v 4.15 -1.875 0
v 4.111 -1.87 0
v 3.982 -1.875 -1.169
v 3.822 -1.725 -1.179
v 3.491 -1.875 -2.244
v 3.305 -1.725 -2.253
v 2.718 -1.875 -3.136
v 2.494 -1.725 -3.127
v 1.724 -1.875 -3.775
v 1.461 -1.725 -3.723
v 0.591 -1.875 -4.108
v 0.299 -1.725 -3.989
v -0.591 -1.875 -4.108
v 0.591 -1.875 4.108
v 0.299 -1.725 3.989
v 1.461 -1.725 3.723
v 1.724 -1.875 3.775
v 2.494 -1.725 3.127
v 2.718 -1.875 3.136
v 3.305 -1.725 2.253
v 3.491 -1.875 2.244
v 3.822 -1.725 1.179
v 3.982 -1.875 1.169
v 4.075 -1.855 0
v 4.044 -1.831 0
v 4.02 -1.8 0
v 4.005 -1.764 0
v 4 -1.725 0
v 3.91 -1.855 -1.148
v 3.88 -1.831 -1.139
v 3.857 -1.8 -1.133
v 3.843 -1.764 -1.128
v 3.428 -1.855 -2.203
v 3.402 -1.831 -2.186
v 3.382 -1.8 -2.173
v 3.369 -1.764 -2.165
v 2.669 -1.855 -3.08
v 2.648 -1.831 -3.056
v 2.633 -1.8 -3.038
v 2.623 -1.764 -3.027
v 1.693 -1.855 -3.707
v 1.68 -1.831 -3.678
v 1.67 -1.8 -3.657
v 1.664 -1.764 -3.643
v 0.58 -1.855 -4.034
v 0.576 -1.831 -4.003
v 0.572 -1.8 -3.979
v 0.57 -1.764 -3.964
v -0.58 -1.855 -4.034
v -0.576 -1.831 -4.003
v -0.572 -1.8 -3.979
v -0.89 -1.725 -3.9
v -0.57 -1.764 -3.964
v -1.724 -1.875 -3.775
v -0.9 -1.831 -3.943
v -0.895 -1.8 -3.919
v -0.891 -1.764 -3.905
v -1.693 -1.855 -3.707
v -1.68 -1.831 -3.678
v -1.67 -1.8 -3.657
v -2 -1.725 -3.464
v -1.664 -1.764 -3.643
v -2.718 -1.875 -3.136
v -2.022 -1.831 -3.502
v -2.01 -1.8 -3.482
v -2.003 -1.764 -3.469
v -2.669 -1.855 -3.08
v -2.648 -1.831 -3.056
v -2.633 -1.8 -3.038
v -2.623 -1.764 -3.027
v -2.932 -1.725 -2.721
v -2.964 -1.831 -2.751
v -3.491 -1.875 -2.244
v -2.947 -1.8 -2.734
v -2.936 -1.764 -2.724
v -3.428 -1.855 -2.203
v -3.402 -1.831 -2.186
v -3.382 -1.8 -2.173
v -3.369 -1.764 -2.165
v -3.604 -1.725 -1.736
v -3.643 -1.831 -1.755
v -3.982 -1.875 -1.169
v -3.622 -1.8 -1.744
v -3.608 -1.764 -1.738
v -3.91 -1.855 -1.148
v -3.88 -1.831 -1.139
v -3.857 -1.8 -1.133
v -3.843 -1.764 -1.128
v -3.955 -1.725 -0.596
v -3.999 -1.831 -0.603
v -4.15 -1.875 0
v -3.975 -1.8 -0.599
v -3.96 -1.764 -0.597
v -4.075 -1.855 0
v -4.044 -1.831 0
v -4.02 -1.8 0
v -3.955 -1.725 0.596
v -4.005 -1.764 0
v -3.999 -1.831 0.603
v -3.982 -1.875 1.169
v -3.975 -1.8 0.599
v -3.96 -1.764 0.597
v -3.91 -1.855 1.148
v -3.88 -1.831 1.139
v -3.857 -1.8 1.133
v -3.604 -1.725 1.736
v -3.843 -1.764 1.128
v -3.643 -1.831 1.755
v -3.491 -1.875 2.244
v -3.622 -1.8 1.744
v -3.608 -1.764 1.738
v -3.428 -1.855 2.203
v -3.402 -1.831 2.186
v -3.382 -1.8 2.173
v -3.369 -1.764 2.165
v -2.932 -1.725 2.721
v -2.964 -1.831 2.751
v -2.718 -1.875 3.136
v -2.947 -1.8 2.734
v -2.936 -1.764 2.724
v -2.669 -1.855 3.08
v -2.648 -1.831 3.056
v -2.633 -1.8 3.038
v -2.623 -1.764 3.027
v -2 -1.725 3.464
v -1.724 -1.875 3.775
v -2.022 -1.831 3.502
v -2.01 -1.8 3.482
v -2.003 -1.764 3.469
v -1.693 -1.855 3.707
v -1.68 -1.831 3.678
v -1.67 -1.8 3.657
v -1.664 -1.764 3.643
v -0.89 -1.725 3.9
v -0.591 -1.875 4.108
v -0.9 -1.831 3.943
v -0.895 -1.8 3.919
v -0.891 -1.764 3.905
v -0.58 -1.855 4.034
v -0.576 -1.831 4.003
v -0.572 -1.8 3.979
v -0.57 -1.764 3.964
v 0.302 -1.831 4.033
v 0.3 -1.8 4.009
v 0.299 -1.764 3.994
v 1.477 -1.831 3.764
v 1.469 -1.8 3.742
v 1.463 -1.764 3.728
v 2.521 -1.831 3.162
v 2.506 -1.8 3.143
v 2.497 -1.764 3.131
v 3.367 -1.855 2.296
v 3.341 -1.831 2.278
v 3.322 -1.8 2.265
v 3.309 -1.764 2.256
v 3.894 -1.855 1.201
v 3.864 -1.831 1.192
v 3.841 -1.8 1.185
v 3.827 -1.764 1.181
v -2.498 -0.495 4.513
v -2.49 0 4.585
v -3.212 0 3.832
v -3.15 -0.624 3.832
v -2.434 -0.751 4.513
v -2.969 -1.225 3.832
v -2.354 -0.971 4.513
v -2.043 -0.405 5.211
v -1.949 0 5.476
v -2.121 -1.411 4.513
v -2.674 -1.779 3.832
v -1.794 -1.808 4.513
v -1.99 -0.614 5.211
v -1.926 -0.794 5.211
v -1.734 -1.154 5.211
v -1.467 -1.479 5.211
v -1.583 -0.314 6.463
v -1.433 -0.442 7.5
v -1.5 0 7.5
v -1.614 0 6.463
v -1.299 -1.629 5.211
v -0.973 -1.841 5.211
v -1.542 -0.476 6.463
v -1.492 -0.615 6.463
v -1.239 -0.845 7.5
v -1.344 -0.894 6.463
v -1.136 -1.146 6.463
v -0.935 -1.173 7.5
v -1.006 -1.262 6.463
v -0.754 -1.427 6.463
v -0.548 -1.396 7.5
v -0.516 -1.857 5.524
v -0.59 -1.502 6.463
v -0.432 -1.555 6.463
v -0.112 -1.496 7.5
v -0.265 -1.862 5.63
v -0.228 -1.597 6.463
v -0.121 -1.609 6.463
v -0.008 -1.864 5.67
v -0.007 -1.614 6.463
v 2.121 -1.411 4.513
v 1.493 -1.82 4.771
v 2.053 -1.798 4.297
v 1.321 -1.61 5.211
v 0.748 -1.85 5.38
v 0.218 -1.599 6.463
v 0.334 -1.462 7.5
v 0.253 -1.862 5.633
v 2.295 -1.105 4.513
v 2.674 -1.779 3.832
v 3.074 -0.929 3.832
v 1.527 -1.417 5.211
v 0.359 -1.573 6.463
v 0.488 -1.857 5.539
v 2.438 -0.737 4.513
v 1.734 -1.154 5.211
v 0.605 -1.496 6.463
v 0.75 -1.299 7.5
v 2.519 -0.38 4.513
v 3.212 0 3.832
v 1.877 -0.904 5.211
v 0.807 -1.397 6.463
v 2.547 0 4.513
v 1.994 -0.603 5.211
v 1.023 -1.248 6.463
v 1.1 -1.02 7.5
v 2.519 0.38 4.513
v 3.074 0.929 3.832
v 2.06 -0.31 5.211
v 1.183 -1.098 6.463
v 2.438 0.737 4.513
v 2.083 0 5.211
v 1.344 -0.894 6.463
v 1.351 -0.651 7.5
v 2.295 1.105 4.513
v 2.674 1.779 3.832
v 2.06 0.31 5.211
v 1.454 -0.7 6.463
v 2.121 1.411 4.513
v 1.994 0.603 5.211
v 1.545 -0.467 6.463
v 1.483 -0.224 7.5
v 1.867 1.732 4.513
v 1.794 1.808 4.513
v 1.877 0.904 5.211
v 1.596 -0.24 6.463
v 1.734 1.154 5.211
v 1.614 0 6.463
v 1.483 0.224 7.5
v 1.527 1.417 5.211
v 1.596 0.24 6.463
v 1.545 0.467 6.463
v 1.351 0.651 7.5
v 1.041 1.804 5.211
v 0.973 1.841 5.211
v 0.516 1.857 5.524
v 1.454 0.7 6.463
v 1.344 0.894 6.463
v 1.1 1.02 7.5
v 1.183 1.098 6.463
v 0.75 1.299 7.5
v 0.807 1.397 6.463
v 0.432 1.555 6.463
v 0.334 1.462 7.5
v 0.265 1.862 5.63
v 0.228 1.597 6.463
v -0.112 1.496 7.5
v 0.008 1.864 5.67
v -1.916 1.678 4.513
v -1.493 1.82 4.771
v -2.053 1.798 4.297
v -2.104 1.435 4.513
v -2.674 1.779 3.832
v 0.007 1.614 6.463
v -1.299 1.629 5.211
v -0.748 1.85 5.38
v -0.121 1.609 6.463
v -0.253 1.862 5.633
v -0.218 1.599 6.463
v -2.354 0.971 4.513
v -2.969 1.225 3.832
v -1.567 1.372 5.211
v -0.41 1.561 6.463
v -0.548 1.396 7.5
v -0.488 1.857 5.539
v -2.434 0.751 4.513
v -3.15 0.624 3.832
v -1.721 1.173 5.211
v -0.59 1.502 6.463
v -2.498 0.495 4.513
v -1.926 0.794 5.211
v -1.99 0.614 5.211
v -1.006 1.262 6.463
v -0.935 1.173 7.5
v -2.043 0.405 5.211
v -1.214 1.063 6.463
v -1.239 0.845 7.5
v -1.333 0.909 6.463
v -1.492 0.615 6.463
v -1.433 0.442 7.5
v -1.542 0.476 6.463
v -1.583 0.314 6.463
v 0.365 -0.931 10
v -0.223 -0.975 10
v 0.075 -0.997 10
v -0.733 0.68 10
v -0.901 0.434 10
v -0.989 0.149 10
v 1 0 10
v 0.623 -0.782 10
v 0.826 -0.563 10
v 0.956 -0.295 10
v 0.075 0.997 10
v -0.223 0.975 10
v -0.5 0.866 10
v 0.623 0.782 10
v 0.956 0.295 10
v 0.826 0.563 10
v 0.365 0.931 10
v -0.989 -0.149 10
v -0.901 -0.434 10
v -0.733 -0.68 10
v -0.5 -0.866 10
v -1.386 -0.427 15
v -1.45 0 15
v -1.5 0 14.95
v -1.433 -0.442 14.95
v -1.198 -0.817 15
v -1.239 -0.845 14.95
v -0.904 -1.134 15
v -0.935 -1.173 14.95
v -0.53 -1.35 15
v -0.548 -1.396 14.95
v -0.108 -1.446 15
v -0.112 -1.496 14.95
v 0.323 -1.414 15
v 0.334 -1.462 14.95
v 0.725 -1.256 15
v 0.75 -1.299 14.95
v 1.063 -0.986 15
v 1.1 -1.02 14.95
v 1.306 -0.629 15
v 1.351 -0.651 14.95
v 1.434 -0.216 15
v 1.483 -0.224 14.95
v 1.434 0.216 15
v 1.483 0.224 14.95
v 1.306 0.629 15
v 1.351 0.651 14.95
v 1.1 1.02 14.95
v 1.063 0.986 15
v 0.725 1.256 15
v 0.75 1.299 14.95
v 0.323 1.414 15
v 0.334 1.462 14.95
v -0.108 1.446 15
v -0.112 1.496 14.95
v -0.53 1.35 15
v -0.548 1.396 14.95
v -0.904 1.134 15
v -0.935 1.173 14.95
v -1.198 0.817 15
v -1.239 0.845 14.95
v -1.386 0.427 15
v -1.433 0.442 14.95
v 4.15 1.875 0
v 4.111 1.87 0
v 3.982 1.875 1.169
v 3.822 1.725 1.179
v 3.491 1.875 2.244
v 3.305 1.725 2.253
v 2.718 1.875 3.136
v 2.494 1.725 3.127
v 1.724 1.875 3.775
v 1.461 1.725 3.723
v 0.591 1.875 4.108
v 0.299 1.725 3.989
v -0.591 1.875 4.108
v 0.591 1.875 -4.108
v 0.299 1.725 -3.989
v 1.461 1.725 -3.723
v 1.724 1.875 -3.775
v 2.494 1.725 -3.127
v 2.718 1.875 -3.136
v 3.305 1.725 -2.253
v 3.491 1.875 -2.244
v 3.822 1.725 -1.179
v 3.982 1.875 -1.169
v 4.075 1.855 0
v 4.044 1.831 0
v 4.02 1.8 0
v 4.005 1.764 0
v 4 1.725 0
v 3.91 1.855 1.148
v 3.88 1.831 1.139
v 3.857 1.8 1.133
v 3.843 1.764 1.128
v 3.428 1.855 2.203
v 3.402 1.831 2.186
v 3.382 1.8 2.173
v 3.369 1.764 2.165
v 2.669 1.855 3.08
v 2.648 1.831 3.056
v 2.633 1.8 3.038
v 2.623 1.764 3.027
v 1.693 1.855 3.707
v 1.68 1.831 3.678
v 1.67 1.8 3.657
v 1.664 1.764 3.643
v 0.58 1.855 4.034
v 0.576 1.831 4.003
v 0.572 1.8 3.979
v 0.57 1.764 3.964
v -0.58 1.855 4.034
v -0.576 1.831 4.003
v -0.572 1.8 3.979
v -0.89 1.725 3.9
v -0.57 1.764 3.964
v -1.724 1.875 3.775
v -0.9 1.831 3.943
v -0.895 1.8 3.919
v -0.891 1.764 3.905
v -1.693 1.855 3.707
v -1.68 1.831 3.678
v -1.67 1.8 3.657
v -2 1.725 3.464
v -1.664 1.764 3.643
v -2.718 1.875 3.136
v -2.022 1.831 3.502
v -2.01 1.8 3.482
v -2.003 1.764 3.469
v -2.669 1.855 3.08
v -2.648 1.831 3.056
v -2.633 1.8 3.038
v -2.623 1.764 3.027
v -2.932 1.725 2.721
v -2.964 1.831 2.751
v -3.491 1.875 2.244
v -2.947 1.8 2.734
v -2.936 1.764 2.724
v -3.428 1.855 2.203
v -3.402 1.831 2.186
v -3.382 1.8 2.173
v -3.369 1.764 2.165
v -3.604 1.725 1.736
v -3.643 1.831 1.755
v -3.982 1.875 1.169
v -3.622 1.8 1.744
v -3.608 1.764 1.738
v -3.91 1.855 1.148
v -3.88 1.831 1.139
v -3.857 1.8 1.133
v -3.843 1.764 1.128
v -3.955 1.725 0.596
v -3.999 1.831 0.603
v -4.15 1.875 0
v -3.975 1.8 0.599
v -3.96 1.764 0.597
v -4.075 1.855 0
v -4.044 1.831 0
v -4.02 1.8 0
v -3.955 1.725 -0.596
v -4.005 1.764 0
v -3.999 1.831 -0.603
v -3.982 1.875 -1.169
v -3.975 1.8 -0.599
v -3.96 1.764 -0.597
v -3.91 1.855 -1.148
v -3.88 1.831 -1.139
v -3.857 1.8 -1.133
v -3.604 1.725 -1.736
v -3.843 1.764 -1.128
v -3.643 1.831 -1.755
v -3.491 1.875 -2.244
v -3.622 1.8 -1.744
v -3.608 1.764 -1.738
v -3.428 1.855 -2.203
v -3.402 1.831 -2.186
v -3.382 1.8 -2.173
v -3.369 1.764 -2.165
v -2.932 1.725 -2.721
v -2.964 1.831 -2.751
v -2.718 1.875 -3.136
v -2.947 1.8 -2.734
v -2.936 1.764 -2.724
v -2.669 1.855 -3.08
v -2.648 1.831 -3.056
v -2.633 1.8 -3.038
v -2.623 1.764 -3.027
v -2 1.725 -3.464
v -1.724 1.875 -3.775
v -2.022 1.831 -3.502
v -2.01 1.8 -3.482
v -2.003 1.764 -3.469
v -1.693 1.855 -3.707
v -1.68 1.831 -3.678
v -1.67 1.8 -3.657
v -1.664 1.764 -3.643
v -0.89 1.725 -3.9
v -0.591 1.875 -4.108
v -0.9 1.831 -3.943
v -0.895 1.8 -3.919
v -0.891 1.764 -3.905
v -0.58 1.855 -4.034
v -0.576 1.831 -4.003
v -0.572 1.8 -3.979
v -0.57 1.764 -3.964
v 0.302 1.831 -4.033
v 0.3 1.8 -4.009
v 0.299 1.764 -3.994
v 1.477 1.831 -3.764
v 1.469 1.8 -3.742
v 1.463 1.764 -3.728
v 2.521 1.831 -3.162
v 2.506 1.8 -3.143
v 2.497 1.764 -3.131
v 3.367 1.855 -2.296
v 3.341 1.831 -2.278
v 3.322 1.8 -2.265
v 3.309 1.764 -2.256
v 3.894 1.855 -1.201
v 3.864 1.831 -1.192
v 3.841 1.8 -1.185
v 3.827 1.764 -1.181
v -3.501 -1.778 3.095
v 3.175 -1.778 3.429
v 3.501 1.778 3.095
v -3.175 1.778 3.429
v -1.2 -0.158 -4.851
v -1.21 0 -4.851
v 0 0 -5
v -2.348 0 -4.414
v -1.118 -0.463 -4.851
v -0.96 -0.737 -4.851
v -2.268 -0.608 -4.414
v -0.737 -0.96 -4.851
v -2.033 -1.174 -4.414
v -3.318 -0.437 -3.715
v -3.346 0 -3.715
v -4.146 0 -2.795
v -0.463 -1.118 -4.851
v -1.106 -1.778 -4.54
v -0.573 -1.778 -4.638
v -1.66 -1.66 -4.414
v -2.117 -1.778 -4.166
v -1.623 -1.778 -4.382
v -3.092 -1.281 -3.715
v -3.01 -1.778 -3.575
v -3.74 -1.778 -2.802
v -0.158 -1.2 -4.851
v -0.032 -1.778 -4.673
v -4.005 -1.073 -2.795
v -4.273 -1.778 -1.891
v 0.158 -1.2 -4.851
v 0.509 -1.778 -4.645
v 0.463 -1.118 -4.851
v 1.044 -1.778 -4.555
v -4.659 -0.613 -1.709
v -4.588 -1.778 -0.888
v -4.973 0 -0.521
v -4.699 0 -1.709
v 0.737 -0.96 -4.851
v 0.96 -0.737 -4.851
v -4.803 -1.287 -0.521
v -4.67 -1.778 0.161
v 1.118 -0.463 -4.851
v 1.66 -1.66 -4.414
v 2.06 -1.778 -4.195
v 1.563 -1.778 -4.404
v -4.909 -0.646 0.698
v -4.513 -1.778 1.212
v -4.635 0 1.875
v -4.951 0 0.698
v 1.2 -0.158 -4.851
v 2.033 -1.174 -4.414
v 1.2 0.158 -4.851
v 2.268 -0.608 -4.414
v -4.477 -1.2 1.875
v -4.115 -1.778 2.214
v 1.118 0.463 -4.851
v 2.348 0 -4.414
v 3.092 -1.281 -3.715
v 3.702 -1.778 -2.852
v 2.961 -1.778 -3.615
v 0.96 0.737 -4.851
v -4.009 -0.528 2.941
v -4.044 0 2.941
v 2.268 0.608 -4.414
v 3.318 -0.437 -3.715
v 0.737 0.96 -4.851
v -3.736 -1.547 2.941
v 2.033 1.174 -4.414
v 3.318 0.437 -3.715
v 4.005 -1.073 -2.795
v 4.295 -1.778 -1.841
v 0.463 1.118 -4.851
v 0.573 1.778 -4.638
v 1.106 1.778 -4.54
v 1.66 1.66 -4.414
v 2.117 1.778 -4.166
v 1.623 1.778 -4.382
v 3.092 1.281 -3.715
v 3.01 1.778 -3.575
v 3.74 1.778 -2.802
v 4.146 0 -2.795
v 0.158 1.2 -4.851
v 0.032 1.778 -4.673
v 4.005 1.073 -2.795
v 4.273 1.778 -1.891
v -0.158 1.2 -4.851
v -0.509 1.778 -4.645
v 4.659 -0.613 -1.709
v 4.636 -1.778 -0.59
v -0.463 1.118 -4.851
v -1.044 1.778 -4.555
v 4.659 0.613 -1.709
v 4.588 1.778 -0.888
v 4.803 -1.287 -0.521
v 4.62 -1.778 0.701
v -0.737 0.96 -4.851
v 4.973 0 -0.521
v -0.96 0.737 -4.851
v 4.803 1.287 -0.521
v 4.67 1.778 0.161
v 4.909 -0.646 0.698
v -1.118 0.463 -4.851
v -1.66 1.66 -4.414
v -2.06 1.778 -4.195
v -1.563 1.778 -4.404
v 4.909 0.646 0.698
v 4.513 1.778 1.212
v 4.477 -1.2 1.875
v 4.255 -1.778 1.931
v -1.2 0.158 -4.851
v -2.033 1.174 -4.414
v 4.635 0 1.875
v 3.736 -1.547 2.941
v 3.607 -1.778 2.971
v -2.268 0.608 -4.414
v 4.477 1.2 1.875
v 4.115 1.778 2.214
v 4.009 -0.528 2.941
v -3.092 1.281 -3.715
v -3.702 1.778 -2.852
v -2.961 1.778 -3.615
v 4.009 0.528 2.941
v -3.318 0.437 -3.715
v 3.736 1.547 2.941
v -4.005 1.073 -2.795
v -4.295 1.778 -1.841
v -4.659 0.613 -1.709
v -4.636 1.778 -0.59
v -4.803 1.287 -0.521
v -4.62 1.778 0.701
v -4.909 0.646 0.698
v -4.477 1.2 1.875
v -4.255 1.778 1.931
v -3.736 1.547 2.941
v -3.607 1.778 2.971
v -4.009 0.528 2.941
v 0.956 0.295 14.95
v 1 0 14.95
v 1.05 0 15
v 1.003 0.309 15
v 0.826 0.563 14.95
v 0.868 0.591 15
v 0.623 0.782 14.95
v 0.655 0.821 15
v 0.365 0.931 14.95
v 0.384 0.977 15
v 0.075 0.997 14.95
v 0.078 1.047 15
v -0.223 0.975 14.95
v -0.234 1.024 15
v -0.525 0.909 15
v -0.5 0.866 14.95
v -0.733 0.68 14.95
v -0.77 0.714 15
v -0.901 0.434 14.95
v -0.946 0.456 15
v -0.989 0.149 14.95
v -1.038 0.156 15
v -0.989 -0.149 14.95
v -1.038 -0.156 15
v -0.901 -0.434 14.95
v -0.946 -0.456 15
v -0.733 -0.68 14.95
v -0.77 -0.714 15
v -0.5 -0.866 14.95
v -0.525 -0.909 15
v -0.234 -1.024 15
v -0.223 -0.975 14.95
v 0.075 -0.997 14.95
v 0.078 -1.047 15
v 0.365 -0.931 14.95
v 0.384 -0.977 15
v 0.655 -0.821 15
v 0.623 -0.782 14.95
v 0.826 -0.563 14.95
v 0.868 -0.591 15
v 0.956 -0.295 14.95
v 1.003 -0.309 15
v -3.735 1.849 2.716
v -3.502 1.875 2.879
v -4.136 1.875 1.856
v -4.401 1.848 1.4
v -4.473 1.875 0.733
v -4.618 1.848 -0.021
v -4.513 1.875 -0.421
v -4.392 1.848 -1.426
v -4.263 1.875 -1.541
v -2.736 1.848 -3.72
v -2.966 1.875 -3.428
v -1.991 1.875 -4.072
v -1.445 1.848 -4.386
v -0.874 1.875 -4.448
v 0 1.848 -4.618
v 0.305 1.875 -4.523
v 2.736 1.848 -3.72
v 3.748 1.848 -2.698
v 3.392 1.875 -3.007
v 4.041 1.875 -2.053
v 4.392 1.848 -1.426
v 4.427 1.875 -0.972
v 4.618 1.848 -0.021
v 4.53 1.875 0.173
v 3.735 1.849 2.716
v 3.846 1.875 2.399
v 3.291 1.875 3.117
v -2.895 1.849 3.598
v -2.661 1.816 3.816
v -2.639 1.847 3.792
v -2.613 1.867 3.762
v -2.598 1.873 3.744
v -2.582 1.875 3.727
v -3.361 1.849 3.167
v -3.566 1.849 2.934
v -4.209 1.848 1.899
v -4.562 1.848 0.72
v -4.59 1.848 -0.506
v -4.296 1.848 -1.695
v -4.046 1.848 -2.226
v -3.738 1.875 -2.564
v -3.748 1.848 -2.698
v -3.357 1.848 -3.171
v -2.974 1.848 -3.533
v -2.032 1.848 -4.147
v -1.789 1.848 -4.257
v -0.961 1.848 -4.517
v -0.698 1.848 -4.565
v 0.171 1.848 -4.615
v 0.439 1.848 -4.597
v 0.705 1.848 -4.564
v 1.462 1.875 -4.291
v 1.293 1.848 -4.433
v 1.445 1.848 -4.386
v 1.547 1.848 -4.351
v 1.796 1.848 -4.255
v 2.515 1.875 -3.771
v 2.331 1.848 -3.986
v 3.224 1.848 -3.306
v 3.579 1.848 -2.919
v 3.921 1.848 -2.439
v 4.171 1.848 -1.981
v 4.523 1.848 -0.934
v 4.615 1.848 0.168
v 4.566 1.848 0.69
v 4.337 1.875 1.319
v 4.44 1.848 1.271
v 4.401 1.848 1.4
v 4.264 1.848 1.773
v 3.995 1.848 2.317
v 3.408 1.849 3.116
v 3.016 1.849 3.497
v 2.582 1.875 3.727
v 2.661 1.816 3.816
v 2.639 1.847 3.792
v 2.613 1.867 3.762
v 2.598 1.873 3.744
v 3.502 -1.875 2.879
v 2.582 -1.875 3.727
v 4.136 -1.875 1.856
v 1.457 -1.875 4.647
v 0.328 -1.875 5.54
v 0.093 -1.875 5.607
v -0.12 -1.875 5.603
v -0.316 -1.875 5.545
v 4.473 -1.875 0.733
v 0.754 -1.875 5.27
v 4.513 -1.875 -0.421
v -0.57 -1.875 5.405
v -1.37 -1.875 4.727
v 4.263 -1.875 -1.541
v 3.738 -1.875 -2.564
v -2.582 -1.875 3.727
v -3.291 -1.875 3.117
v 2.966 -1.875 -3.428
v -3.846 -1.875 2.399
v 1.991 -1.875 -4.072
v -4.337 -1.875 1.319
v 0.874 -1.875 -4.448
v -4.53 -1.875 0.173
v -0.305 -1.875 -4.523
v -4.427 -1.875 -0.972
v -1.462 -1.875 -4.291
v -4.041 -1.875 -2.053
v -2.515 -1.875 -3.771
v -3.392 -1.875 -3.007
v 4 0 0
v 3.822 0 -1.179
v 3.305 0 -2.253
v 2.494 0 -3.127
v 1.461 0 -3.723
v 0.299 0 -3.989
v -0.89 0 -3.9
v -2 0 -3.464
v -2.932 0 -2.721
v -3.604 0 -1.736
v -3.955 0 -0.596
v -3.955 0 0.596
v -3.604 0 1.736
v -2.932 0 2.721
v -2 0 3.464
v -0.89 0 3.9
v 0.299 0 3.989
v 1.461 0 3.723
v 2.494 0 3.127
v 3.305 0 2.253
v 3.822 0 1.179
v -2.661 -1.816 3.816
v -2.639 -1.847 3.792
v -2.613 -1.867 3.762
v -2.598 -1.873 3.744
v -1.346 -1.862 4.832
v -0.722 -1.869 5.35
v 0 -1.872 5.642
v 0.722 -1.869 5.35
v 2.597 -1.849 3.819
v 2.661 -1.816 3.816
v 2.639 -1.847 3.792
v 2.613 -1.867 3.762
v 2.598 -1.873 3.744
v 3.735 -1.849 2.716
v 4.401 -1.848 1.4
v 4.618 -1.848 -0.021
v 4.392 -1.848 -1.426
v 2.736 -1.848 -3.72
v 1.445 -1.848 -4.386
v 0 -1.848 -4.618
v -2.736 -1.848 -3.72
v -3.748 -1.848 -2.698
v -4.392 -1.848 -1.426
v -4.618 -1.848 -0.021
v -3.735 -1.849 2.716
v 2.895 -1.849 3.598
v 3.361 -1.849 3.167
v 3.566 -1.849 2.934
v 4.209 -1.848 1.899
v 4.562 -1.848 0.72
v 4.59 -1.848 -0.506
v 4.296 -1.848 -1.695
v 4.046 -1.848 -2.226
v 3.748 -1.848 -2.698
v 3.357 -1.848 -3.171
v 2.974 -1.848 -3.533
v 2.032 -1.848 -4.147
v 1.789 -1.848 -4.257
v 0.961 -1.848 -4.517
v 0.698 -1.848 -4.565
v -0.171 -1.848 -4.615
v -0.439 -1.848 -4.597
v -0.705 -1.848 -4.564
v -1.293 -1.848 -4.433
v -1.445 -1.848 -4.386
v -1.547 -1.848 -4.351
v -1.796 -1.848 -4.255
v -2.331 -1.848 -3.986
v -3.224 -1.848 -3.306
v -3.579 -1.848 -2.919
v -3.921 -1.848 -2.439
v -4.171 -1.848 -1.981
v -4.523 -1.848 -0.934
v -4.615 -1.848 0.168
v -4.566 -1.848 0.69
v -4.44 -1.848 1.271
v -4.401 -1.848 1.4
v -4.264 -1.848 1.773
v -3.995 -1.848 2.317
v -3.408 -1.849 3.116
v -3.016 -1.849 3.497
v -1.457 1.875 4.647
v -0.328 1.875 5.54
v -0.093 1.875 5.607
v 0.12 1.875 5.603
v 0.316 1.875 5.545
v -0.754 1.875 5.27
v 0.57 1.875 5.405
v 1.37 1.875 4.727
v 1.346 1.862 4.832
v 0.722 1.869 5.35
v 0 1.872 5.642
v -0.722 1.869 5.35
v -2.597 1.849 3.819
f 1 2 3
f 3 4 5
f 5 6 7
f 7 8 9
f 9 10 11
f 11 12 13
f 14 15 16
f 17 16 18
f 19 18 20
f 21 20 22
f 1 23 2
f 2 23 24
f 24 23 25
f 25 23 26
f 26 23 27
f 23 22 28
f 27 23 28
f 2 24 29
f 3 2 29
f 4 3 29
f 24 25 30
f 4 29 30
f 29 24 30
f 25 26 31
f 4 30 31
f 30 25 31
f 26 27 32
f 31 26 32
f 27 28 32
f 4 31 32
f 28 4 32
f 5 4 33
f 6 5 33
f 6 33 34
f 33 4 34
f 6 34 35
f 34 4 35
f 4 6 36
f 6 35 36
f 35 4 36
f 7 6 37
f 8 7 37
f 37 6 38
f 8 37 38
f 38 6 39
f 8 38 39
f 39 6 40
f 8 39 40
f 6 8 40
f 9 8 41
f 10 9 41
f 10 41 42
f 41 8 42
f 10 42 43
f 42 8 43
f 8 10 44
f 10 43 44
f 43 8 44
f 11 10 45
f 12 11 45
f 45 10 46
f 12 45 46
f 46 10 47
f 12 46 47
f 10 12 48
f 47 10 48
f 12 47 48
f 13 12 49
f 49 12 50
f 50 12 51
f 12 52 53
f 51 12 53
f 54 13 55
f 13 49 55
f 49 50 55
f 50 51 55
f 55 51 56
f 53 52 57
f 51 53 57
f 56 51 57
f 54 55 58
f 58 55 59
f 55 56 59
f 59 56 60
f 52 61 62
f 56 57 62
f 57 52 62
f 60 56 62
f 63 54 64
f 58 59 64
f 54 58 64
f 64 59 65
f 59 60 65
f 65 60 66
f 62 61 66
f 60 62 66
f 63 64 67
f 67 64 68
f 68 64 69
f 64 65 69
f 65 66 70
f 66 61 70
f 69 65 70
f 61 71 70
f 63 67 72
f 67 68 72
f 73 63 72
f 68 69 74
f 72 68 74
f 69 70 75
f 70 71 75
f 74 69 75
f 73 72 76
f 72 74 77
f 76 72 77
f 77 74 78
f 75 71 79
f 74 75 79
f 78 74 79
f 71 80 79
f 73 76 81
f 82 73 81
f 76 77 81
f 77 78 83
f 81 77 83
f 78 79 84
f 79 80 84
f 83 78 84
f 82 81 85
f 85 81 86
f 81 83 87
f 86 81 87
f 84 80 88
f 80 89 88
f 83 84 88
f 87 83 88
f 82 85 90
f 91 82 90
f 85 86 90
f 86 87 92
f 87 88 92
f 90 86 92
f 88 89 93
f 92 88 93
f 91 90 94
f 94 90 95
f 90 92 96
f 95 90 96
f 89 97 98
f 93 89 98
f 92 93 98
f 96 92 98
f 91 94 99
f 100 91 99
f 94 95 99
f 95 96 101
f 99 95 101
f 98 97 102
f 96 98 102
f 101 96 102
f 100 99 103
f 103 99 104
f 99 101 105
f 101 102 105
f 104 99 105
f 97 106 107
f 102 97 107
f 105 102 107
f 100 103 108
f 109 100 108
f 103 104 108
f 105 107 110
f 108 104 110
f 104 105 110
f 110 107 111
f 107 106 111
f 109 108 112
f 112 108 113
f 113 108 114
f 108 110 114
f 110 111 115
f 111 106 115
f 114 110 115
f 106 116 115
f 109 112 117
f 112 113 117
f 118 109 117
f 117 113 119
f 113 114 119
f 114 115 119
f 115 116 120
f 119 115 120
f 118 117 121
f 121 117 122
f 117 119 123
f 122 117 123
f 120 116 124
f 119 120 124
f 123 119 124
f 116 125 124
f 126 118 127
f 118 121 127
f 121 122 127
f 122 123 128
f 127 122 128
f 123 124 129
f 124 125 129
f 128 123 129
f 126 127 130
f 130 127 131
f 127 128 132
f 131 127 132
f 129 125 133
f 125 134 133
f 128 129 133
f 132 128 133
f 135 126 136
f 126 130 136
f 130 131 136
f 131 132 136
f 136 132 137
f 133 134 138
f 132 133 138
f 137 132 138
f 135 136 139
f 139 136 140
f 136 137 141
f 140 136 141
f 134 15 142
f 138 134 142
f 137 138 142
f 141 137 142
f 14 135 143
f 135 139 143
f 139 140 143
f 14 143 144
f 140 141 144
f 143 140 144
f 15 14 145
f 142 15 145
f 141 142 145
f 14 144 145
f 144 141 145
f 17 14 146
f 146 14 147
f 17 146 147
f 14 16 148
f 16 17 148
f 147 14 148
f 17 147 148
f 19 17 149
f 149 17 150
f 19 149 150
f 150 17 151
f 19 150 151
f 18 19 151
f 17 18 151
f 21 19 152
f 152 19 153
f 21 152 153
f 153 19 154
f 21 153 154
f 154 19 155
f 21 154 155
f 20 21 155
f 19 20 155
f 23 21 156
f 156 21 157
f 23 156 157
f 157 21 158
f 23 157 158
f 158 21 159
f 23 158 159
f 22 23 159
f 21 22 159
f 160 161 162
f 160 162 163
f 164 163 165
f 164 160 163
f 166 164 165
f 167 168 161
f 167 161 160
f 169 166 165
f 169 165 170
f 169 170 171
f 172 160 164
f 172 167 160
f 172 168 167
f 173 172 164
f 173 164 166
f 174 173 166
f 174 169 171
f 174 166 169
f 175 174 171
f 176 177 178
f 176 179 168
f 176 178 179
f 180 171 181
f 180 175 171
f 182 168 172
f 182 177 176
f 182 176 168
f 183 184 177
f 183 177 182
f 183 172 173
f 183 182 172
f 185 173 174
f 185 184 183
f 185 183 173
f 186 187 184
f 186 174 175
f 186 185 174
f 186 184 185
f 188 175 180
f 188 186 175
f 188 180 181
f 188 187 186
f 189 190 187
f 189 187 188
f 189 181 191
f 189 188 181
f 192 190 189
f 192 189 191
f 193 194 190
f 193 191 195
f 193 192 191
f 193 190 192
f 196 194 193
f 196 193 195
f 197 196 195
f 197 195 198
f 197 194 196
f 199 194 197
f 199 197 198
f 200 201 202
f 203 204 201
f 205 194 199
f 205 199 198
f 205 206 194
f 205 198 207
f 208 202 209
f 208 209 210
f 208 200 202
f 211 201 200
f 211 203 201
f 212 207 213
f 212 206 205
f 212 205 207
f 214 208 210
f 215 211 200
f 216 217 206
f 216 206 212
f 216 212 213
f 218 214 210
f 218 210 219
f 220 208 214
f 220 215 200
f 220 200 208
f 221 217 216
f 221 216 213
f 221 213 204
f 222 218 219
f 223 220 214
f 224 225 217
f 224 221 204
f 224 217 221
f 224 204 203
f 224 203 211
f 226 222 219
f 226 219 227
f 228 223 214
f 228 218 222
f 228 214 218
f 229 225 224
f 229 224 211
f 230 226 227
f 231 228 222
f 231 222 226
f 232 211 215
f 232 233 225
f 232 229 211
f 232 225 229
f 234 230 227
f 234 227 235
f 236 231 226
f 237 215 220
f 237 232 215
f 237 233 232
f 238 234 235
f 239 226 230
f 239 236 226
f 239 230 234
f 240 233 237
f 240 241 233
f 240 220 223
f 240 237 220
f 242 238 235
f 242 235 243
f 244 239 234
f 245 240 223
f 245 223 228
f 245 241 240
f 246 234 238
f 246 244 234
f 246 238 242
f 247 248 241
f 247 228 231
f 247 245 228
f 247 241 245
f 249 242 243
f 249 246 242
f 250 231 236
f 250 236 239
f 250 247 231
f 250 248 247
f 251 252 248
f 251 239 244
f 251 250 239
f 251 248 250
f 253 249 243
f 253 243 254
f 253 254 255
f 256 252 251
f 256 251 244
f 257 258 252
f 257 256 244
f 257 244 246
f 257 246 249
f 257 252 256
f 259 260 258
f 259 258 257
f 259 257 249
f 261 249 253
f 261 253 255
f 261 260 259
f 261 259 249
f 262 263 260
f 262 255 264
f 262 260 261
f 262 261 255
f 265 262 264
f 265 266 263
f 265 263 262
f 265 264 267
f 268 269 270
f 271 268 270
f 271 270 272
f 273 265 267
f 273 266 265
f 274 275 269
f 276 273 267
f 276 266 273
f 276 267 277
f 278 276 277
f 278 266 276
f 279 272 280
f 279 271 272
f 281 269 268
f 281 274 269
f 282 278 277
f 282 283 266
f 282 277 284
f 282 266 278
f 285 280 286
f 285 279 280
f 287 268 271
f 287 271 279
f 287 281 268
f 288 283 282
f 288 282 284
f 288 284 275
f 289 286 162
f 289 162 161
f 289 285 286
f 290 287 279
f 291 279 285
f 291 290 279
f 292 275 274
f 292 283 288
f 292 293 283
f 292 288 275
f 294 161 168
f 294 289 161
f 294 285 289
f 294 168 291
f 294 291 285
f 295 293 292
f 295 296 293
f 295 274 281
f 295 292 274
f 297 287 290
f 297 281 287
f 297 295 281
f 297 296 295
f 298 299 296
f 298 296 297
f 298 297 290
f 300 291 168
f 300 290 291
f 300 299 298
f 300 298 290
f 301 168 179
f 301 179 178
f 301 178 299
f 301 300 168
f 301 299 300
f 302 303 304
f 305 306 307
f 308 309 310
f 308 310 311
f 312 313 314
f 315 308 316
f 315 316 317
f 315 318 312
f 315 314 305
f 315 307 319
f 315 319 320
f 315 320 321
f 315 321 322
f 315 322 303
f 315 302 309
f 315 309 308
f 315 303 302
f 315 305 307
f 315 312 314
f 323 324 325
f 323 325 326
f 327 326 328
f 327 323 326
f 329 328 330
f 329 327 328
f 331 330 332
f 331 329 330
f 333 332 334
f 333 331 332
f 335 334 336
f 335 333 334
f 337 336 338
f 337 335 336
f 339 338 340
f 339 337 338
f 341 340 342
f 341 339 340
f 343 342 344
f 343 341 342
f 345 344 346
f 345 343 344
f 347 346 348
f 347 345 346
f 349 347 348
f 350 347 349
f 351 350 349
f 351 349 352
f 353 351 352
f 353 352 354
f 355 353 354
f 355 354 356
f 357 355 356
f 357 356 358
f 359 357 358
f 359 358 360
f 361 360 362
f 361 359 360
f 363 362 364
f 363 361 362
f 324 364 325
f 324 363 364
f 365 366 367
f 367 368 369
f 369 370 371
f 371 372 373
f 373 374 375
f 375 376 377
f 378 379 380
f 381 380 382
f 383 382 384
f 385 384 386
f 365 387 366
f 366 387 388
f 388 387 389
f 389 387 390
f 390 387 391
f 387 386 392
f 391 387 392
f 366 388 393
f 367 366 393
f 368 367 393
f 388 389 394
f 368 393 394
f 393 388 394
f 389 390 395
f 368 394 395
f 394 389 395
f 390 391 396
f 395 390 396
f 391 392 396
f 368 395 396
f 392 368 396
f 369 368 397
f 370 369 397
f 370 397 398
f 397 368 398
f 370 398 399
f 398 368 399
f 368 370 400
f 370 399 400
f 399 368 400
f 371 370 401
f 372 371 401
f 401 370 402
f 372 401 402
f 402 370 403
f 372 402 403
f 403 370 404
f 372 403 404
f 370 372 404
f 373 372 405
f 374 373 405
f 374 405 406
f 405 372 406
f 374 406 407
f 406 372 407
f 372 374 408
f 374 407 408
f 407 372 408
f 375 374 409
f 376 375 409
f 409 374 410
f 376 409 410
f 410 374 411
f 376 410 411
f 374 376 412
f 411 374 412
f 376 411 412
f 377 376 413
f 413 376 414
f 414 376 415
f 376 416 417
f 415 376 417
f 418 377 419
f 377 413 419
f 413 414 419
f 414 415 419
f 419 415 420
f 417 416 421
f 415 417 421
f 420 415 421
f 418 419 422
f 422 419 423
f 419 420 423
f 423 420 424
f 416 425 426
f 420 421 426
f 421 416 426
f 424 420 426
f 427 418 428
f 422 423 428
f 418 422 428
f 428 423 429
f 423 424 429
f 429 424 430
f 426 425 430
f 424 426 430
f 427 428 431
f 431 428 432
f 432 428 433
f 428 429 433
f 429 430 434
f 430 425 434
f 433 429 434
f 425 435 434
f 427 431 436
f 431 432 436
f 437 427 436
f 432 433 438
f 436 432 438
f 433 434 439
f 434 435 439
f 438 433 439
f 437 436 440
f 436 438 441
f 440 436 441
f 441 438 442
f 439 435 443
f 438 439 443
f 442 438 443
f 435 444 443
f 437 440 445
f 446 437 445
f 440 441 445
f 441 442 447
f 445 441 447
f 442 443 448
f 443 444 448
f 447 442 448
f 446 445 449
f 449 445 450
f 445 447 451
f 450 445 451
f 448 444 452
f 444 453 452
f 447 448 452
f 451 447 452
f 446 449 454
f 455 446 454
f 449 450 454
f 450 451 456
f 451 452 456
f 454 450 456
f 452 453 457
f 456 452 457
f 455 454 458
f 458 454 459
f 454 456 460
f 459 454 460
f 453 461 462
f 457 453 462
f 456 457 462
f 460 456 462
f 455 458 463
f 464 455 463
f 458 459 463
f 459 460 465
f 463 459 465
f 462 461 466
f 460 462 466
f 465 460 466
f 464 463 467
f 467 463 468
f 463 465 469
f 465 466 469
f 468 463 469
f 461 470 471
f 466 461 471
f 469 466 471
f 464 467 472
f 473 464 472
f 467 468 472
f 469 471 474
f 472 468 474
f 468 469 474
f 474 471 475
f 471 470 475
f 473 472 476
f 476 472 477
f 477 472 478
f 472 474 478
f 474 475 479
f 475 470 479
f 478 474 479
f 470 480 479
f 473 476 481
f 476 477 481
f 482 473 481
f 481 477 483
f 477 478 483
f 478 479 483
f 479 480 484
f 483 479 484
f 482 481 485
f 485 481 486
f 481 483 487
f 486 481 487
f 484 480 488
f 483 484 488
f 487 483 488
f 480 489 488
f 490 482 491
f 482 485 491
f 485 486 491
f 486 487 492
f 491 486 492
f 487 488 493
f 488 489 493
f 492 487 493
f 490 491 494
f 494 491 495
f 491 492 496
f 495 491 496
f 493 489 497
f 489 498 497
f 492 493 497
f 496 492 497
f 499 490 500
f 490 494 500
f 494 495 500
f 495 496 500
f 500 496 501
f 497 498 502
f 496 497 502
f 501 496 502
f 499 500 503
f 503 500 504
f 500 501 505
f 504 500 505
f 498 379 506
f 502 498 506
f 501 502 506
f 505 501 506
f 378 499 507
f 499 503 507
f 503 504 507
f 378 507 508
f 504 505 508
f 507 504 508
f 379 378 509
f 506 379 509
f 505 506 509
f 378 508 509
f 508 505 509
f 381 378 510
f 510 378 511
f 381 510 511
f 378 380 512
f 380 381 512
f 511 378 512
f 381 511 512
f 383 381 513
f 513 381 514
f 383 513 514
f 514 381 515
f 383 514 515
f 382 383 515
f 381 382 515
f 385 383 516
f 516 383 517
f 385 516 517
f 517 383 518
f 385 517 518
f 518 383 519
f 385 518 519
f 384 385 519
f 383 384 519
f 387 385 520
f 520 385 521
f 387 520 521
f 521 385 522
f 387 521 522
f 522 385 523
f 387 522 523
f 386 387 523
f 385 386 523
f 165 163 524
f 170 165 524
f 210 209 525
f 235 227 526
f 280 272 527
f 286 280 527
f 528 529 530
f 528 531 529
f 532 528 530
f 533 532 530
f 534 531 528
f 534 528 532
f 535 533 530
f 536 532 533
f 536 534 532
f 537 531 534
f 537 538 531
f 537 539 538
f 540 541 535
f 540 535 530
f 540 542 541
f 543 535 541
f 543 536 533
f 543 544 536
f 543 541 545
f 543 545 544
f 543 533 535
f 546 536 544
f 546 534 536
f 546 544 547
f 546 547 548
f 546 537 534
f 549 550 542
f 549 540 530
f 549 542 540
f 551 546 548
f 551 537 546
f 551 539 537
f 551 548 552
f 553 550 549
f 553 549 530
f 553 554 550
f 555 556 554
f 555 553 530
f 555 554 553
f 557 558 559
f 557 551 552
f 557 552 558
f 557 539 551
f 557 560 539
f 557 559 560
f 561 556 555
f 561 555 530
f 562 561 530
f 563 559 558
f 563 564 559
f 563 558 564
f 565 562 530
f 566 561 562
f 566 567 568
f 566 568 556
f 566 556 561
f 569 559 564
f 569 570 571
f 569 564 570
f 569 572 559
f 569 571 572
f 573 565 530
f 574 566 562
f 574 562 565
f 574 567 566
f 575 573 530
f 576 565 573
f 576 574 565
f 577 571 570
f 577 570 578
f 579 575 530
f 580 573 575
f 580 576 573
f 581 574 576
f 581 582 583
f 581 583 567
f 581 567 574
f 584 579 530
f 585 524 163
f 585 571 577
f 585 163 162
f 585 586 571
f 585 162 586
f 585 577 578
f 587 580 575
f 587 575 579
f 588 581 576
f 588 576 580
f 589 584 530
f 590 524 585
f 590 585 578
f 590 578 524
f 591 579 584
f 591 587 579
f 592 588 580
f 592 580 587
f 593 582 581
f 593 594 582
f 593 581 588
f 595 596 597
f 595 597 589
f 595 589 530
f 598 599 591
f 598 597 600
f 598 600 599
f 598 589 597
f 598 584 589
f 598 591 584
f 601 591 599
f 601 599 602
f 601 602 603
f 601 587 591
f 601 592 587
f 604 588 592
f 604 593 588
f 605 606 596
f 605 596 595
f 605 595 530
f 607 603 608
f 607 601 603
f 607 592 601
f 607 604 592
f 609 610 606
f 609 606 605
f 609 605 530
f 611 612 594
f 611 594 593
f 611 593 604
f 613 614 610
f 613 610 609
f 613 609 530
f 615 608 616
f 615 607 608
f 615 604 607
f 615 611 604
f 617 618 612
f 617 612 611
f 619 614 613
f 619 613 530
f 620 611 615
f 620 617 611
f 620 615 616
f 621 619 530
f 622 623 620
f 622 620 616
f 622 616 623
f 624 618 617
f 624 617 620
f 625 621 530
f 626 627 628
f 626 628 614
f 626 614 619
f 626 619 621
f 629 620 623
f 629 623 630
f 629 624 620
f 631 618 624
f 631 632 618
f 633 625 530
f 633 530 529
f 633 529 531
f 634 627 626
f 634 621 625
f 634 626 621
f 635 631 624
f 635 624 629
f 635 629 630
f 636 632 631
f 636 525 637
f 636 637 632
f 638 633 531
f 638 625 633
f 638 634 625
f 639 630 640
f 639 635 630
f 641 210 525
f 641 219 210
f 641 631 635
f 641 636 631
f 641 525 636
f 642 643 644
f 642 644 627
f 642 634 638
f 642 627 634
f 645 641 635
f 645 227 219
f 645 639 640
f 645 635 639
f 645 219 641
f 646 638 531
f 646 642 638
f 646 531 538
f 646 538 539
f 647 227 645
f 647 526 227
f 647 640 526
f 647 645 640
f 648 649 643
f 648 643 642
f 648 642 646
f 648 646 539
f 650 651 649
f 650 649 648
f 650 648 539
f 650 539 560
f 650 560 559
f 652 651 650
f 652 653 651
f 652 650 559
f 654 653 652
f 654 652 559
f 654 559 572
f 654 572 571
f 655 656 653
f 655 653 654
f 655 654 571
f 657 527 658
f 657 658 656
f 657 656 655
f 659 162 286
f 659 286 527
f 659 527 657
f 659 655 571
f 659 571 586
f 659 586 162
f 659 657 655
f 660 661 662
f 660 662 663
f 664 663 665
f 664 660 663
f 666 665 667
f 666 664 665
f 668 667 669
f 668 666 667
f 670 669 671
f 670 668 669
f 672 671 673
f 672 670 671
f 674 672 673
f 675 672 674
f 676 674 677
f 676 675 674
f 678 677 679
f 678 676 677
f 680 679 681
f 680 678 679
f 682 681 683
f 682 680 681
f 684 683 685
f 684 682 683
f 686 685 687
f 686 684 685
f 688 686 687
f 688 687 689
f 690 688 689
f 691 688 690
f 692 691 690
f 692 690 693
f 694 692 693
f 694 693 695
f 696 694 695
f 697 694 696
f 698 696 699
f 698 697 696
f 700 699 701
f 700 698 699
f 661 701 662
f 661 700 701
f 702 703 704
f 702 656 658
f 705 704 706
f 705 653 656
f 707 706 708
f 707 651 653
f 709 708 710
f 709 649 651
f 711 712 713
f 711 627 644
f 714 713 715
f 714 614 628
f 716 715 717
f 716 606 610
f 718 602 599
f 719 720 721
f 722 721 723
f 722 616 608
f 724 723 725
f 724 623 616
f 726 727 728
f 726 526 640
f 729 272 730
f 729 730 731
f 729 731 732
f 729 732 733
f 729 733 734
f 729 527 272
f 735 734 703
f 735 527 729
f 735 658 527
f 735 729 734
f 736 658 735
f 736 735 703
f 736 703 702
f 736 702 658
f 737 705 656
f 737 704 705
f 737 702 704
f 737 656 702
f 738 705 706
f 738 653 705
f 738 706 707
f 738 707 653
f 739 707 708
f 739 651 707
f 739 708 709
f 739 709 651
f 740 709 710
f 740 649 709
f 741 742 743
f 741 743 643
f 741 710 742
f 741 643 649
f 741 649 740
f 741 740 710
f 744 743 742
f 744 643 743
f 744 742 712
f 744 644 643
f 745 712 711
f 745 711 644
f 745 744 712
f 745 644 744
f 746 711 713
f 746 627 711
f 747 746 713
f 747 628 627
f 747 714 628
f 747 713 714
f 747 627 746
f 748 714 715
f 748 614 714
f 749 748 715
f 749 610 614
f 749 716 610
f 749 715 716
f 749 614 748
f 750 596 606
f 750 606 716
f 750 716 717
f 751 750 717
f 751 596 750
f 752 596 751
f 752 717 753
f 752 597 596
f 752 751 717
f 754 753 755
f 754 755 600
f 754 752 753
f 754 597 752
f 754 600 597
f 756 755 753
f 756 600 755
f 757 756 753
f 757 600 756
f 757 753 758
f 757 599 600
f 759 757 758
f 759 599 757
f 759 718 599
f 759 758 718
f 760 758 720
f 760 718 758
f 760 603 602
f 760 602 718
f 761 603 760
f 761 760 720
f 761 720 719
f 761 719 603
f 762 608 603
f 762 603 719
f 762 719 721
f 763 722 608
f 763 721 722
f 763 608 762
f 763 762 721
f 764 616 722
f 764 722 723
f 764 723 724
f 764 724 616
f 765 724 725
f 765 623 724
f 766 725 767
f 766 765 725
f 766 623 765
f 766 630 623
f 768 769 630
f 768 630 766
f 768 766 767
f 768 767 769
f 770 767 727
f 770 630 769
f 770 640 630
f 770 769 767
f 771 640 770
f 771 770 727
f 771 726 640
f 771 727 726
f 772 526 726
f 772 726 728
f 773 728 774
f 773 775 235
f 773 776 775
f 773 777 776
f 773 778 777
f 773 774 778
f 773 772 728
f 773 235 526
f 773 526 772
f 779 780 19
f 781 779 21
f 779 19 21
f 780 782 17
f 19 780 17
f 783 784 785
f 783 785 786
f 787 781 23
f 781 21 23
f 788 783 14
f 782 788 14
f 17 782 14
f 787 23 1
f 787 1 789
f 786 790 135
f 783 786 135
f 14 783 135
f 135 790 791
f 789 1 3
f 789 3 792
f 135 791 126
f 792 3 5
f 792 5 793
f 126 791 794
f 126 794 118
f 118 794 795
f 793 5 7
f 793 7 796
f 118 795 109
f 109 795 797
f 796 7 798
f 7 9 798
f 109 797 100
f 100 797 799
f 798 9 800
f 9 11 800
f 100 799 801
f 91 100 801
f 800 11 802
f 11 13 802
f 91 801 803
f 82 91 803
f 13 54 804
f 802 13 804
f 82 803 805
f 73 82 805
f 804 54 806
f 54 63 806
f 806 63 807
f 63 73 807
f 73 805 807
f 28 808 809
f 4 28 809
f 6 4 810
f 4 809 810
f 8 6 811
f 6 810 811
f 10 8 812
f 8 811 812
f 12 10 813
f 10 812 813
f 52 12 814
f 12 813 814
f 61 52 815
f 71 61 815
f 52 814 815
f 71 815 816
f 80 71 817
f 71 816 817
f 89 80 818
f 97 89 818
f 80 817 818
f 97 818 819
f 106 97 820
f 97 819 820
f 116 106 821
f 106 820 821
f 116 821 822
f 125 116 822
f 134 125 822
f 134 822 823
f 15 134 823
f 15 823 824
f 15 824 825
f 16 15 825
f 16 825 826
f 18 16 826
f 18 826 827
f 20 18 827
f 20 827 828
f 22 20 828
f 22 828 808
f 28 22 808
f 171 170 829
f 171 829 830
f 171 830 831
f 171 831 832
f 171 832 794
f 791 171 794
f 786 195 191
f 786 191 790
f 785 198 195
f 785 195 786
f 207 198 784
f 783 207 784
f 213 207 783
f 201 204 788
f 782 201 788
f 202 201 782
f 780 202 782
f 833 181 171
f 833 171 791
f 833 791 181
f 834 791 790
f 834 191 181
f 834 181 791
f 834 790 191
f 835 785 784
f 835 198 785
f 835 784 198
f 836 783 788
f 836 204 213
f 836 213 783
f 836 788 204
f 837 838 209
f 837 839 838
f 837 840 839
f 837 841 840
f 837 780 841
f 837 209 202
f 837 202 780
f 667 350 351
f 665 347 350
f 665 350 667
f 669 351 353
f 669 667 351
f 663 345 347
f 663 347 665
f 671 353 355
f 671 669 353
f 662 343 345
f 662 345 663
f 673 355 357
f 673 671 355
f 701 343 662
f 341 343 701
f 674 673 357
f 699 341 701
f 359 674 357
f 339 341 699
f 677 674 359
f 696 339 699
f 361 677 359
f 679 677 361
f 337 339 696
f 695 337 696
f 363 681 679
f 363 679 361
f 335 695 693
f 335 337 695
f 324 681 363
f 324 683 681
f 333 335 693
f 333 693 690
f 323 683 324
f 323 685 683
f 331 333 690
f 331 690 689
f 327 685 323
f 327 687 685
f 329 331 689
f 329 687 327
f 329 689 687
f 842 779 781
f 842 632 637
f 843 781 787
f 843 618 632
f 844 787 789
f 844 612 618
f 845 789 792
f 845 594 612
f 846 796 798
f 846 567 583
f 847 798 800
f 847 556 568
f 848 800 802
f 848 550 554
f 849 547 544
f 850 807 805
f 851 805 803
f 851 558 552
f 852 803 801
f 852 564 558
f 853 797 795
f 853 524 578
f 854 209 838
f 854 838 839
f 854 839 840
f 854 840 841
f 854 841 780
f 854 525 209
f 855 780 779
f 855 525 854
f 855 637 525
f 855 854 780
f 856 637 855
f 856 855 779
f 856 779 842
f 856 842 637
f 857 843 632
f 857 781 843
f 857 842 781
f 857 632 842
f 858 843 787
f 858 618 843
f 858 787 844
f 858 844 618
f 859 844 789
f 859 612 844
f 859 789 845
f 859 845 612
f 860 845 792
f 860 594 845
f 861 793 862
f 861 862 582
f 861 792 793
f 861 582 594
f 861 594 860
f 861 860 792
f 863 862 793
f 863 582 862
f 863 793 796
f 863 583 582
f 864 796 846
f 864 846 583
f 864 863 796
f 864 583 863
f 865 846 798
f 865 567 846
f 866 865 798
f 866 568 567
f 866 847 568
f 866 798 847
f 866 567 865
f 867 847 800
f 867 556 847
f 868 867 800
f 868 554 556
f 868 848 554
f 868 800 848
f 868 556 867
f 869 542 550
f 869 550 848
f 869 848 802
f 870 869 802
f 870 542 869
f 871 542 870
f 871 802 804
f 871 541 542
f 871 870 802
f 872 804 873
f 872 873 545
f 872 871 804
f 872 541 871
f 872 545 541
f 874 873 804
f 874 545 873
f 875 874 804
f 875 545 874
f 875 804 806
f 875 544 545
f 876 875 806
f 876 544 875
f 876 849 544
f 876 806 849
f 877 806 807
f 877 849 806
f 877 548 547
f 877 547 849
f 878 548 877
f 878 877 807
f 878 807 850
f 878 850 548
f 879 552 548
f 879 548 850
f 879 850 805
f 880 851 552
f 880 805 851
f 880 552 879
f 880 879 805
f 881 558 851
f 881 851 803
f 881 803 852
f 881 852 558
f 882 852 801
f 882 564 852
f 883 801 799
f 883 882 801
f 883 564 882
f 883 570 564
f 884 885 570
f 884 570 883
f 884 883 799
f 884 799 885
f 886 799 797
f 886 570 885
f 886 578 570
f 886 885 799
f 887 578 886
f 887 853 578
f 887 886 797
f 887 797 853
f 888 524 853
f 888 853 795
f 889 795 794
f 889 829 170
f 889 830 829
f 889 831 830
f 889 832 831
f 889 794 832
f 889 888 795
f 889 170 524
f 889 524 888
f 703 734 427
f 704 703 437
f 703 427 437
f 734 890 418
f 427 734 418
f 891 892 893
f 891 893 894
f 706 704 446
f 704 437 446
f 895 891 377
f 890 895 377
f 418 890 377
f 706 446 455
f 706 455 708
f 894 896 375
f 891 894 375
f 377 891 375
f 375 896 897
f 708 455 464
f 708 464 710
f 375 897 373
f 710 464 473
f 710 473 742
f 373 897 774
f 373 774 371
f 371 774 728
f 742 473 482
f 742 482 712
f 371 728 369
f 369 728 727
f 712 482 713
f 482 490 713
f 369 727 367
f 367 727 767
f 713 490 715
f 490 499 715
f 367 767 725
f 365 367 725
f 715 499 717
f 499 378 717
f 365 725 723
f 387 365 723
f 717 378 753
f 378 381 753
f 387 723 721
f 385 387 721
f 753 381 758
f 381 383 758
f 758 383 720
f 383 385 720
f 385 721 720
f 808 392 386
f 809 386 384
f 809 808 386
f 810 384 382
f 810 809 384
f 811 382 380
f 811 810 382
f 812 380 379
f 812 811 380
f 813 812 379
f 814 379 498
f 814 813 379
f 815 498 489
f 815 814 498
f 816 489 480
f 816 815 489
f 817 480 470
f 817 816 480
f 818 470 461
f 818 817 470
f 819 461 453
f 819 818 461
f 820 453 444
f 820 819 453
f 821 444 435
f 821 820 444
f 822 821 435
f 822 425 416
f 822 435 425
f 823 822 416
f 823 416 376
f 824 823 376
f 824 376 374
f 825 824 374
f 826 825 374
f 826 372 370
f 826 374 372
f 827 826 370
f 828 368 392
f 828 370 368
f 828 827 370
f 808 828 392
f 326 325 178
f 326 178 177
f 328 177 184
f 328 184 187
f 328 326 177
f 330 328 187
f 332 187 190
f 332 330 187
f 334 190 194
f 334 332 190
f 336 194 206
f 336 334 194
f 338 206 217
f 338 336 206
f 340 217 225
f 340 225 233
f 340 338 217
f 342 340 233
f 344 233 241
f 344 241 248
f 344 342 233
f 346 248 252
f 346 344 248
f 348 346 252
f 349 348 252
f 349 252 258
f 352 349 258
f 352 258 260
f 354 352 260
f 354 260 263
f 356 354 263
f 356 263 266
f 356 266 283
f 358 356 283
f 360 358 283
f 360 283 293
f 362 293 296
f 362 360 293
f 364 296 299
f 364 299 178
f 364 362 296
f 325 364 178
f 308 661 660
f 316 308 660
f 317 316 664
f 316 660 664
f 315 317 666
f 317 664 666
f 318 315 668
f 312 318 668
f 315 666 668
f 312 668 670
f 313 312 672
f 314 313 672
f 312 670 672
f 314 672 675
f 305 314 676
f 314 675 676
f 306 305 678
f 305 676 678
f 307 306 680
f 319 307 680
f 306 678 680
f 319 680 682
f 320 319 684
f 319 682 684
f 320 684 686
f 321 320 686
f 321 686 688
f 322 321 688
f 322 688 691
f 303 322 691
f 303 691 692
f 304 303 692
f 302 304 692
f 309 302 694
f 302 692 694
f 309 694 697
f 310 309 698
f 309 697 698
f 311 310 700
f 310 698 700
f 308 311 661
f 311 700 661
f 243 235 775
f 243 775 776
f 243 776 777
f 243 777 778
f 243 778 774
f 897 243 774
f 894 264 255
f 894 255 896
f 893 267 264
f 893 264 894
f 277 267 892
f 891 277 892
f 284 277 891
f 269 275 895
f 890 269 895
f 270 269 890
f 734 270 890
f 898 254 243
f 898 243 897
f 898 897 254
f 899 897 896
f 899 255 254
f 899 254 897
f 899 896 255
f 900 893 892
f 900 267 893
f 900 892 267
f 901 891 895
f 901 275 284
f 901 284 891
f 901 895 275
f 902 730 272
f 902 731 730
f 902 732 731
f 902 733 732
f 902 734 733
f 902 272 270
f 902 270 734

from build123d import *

# Parameters (mm, degrees)
CUT_EXTRUDE1_DEPTH      = 10
CUT_EXTRUDE1_DEPTH_BACK = 10
CUT_EXTRUDE2_DEPTH      = 10
CUT_EXTRUDE2_DEPTH_BACK = 10
SKETCH4_R               = 4
FILLET1_R               = 0.15
SKETCH5_R               = 1
CUT_EXTRUDE3_DEPTH      = 5
CHAMFER1_SIZE           = 0.05


with BuildPart() as part:
    # Sketch2 → Revolve1 (revolve)
    with BuildSketch(Plane(origin=(0, 0, 0), x_dir=(1, 0, 0), z_dir=(0, 1, 0))):
        with BuildLine():
            Line((-1.5, -15), (0, -15))
            Line((0, -15), (0, 5))
            ThreePointArc((0, 5), (-4.698967117, 1.708715315), (-3.211678832, -3.832116788))
            ThreePointArc((-3.211678832, -3.832116788), (-1.948980687, -5.476190987), (-1.5, -7.5))
            Line((-1.5, -7.5), (-1.5, -15))
        make_face()
    revolve(axis=Axis((0, 0, -5), (0, 0, 1)))

    # Sketch3 → Cut-Extrude1 (cut, two sides: drawn at the far end of the back side and taken through both)
    with BuildSketch(Plane(origin=(0, 0, 0), x_dir=(0, 0, -1), z_dir=(1, 0, 0)).offset(-CUT_EXTRUDE1_DEPTH_BACK)):
        with BuildLine():
            Line((-6.914251905, 1.875), (13.74921602, 1.875))
            Line((13.74921602, 1.875), (13.74921602, 11.382138009))
            Line((13.74921602, 11.382138009), (-22.068346047, 11.382138009))
            Line((-22.068346047, 11.382138009), (-9.782134087, 2.779239779))
            ThreePointArc((-9.782134087, 2.779239779), (-8.417780903, 2.106415246), (-6.914251905, 1.875))
        make_face()
        with BuildLine():
            Line((13.74921602, -11.382138009), (-22.068346047, -11.382138009))
            Line((-22.068346047, -11.382138009), (-9.782134087, -2.779239779))
            ThreePointArc((-9.782134087, -2.779239779), (-8.417780903, -2.106415246), (-6.914251905, -1.875))
            Line((-6.914251905, -1.875), (13.74921602, -1.875))
            Line((13.74921602, -1.875), (13.74921602, -11.382138009))
        make_face()
    extrude(amount=CUT_EXTRUDE1_DEPTH + CUT_EXTRUDE1_DEPTH_BACK, mode=Mode.SUBTRACT)

    # Sketch4 → Cut-Extrude2 (cut, two sides: drawn at the far end of the back side and taken through both)
    with BuildSketch(Plane(origin=(0, 0, 0), x_dir=(1, 0, 0), z_dir=(0, 1, 0)).offset(-CUT_EXTRUDE2_DEPTH_BACK)):
        Circle(SKETCH4_R)
    extrude(amount=CUT_EXTRUDE2_DEPTH + CUT_EXTRUDE2_DEPTH_BACK, mode=Mode.SUBTRACT)

    # Fillet1
    fillet1_edges = [part.edges().sort_by_distance(p)[0] for p in [
        (1e-09, -1.875, 5.642942998),
        (0, 1.875, -4.635124054),
        (-4, 1.875, 0),
        (-4, -1.875, 0),
        (0, -1.875, -4.635124054),
        (-1e-09, 1.875, 5.642942998),
    ]]
    fillet(fillet1_edges, radius=FILLET1_R)

    # Sketch5 → Cut-Extrude3 (cut)
    with BuildSketch(Plane.XY.offset(15)):
        Circle(SKETCH5_R)
    extrude(amount=-CUT_EXTRUDE3_DEPTH, mode=Mode.SUBTRACT)

    # Chamfer1
    chamfer1_edges = [part.edges().sort_by_distance(p)[0] for p in [
        (1.5, 0, 15),
        (-1, 0, 15),
    ]]
    chamfer(chamfer1_edges, length=CHAMFER1_SIZE)


solid = part.part
